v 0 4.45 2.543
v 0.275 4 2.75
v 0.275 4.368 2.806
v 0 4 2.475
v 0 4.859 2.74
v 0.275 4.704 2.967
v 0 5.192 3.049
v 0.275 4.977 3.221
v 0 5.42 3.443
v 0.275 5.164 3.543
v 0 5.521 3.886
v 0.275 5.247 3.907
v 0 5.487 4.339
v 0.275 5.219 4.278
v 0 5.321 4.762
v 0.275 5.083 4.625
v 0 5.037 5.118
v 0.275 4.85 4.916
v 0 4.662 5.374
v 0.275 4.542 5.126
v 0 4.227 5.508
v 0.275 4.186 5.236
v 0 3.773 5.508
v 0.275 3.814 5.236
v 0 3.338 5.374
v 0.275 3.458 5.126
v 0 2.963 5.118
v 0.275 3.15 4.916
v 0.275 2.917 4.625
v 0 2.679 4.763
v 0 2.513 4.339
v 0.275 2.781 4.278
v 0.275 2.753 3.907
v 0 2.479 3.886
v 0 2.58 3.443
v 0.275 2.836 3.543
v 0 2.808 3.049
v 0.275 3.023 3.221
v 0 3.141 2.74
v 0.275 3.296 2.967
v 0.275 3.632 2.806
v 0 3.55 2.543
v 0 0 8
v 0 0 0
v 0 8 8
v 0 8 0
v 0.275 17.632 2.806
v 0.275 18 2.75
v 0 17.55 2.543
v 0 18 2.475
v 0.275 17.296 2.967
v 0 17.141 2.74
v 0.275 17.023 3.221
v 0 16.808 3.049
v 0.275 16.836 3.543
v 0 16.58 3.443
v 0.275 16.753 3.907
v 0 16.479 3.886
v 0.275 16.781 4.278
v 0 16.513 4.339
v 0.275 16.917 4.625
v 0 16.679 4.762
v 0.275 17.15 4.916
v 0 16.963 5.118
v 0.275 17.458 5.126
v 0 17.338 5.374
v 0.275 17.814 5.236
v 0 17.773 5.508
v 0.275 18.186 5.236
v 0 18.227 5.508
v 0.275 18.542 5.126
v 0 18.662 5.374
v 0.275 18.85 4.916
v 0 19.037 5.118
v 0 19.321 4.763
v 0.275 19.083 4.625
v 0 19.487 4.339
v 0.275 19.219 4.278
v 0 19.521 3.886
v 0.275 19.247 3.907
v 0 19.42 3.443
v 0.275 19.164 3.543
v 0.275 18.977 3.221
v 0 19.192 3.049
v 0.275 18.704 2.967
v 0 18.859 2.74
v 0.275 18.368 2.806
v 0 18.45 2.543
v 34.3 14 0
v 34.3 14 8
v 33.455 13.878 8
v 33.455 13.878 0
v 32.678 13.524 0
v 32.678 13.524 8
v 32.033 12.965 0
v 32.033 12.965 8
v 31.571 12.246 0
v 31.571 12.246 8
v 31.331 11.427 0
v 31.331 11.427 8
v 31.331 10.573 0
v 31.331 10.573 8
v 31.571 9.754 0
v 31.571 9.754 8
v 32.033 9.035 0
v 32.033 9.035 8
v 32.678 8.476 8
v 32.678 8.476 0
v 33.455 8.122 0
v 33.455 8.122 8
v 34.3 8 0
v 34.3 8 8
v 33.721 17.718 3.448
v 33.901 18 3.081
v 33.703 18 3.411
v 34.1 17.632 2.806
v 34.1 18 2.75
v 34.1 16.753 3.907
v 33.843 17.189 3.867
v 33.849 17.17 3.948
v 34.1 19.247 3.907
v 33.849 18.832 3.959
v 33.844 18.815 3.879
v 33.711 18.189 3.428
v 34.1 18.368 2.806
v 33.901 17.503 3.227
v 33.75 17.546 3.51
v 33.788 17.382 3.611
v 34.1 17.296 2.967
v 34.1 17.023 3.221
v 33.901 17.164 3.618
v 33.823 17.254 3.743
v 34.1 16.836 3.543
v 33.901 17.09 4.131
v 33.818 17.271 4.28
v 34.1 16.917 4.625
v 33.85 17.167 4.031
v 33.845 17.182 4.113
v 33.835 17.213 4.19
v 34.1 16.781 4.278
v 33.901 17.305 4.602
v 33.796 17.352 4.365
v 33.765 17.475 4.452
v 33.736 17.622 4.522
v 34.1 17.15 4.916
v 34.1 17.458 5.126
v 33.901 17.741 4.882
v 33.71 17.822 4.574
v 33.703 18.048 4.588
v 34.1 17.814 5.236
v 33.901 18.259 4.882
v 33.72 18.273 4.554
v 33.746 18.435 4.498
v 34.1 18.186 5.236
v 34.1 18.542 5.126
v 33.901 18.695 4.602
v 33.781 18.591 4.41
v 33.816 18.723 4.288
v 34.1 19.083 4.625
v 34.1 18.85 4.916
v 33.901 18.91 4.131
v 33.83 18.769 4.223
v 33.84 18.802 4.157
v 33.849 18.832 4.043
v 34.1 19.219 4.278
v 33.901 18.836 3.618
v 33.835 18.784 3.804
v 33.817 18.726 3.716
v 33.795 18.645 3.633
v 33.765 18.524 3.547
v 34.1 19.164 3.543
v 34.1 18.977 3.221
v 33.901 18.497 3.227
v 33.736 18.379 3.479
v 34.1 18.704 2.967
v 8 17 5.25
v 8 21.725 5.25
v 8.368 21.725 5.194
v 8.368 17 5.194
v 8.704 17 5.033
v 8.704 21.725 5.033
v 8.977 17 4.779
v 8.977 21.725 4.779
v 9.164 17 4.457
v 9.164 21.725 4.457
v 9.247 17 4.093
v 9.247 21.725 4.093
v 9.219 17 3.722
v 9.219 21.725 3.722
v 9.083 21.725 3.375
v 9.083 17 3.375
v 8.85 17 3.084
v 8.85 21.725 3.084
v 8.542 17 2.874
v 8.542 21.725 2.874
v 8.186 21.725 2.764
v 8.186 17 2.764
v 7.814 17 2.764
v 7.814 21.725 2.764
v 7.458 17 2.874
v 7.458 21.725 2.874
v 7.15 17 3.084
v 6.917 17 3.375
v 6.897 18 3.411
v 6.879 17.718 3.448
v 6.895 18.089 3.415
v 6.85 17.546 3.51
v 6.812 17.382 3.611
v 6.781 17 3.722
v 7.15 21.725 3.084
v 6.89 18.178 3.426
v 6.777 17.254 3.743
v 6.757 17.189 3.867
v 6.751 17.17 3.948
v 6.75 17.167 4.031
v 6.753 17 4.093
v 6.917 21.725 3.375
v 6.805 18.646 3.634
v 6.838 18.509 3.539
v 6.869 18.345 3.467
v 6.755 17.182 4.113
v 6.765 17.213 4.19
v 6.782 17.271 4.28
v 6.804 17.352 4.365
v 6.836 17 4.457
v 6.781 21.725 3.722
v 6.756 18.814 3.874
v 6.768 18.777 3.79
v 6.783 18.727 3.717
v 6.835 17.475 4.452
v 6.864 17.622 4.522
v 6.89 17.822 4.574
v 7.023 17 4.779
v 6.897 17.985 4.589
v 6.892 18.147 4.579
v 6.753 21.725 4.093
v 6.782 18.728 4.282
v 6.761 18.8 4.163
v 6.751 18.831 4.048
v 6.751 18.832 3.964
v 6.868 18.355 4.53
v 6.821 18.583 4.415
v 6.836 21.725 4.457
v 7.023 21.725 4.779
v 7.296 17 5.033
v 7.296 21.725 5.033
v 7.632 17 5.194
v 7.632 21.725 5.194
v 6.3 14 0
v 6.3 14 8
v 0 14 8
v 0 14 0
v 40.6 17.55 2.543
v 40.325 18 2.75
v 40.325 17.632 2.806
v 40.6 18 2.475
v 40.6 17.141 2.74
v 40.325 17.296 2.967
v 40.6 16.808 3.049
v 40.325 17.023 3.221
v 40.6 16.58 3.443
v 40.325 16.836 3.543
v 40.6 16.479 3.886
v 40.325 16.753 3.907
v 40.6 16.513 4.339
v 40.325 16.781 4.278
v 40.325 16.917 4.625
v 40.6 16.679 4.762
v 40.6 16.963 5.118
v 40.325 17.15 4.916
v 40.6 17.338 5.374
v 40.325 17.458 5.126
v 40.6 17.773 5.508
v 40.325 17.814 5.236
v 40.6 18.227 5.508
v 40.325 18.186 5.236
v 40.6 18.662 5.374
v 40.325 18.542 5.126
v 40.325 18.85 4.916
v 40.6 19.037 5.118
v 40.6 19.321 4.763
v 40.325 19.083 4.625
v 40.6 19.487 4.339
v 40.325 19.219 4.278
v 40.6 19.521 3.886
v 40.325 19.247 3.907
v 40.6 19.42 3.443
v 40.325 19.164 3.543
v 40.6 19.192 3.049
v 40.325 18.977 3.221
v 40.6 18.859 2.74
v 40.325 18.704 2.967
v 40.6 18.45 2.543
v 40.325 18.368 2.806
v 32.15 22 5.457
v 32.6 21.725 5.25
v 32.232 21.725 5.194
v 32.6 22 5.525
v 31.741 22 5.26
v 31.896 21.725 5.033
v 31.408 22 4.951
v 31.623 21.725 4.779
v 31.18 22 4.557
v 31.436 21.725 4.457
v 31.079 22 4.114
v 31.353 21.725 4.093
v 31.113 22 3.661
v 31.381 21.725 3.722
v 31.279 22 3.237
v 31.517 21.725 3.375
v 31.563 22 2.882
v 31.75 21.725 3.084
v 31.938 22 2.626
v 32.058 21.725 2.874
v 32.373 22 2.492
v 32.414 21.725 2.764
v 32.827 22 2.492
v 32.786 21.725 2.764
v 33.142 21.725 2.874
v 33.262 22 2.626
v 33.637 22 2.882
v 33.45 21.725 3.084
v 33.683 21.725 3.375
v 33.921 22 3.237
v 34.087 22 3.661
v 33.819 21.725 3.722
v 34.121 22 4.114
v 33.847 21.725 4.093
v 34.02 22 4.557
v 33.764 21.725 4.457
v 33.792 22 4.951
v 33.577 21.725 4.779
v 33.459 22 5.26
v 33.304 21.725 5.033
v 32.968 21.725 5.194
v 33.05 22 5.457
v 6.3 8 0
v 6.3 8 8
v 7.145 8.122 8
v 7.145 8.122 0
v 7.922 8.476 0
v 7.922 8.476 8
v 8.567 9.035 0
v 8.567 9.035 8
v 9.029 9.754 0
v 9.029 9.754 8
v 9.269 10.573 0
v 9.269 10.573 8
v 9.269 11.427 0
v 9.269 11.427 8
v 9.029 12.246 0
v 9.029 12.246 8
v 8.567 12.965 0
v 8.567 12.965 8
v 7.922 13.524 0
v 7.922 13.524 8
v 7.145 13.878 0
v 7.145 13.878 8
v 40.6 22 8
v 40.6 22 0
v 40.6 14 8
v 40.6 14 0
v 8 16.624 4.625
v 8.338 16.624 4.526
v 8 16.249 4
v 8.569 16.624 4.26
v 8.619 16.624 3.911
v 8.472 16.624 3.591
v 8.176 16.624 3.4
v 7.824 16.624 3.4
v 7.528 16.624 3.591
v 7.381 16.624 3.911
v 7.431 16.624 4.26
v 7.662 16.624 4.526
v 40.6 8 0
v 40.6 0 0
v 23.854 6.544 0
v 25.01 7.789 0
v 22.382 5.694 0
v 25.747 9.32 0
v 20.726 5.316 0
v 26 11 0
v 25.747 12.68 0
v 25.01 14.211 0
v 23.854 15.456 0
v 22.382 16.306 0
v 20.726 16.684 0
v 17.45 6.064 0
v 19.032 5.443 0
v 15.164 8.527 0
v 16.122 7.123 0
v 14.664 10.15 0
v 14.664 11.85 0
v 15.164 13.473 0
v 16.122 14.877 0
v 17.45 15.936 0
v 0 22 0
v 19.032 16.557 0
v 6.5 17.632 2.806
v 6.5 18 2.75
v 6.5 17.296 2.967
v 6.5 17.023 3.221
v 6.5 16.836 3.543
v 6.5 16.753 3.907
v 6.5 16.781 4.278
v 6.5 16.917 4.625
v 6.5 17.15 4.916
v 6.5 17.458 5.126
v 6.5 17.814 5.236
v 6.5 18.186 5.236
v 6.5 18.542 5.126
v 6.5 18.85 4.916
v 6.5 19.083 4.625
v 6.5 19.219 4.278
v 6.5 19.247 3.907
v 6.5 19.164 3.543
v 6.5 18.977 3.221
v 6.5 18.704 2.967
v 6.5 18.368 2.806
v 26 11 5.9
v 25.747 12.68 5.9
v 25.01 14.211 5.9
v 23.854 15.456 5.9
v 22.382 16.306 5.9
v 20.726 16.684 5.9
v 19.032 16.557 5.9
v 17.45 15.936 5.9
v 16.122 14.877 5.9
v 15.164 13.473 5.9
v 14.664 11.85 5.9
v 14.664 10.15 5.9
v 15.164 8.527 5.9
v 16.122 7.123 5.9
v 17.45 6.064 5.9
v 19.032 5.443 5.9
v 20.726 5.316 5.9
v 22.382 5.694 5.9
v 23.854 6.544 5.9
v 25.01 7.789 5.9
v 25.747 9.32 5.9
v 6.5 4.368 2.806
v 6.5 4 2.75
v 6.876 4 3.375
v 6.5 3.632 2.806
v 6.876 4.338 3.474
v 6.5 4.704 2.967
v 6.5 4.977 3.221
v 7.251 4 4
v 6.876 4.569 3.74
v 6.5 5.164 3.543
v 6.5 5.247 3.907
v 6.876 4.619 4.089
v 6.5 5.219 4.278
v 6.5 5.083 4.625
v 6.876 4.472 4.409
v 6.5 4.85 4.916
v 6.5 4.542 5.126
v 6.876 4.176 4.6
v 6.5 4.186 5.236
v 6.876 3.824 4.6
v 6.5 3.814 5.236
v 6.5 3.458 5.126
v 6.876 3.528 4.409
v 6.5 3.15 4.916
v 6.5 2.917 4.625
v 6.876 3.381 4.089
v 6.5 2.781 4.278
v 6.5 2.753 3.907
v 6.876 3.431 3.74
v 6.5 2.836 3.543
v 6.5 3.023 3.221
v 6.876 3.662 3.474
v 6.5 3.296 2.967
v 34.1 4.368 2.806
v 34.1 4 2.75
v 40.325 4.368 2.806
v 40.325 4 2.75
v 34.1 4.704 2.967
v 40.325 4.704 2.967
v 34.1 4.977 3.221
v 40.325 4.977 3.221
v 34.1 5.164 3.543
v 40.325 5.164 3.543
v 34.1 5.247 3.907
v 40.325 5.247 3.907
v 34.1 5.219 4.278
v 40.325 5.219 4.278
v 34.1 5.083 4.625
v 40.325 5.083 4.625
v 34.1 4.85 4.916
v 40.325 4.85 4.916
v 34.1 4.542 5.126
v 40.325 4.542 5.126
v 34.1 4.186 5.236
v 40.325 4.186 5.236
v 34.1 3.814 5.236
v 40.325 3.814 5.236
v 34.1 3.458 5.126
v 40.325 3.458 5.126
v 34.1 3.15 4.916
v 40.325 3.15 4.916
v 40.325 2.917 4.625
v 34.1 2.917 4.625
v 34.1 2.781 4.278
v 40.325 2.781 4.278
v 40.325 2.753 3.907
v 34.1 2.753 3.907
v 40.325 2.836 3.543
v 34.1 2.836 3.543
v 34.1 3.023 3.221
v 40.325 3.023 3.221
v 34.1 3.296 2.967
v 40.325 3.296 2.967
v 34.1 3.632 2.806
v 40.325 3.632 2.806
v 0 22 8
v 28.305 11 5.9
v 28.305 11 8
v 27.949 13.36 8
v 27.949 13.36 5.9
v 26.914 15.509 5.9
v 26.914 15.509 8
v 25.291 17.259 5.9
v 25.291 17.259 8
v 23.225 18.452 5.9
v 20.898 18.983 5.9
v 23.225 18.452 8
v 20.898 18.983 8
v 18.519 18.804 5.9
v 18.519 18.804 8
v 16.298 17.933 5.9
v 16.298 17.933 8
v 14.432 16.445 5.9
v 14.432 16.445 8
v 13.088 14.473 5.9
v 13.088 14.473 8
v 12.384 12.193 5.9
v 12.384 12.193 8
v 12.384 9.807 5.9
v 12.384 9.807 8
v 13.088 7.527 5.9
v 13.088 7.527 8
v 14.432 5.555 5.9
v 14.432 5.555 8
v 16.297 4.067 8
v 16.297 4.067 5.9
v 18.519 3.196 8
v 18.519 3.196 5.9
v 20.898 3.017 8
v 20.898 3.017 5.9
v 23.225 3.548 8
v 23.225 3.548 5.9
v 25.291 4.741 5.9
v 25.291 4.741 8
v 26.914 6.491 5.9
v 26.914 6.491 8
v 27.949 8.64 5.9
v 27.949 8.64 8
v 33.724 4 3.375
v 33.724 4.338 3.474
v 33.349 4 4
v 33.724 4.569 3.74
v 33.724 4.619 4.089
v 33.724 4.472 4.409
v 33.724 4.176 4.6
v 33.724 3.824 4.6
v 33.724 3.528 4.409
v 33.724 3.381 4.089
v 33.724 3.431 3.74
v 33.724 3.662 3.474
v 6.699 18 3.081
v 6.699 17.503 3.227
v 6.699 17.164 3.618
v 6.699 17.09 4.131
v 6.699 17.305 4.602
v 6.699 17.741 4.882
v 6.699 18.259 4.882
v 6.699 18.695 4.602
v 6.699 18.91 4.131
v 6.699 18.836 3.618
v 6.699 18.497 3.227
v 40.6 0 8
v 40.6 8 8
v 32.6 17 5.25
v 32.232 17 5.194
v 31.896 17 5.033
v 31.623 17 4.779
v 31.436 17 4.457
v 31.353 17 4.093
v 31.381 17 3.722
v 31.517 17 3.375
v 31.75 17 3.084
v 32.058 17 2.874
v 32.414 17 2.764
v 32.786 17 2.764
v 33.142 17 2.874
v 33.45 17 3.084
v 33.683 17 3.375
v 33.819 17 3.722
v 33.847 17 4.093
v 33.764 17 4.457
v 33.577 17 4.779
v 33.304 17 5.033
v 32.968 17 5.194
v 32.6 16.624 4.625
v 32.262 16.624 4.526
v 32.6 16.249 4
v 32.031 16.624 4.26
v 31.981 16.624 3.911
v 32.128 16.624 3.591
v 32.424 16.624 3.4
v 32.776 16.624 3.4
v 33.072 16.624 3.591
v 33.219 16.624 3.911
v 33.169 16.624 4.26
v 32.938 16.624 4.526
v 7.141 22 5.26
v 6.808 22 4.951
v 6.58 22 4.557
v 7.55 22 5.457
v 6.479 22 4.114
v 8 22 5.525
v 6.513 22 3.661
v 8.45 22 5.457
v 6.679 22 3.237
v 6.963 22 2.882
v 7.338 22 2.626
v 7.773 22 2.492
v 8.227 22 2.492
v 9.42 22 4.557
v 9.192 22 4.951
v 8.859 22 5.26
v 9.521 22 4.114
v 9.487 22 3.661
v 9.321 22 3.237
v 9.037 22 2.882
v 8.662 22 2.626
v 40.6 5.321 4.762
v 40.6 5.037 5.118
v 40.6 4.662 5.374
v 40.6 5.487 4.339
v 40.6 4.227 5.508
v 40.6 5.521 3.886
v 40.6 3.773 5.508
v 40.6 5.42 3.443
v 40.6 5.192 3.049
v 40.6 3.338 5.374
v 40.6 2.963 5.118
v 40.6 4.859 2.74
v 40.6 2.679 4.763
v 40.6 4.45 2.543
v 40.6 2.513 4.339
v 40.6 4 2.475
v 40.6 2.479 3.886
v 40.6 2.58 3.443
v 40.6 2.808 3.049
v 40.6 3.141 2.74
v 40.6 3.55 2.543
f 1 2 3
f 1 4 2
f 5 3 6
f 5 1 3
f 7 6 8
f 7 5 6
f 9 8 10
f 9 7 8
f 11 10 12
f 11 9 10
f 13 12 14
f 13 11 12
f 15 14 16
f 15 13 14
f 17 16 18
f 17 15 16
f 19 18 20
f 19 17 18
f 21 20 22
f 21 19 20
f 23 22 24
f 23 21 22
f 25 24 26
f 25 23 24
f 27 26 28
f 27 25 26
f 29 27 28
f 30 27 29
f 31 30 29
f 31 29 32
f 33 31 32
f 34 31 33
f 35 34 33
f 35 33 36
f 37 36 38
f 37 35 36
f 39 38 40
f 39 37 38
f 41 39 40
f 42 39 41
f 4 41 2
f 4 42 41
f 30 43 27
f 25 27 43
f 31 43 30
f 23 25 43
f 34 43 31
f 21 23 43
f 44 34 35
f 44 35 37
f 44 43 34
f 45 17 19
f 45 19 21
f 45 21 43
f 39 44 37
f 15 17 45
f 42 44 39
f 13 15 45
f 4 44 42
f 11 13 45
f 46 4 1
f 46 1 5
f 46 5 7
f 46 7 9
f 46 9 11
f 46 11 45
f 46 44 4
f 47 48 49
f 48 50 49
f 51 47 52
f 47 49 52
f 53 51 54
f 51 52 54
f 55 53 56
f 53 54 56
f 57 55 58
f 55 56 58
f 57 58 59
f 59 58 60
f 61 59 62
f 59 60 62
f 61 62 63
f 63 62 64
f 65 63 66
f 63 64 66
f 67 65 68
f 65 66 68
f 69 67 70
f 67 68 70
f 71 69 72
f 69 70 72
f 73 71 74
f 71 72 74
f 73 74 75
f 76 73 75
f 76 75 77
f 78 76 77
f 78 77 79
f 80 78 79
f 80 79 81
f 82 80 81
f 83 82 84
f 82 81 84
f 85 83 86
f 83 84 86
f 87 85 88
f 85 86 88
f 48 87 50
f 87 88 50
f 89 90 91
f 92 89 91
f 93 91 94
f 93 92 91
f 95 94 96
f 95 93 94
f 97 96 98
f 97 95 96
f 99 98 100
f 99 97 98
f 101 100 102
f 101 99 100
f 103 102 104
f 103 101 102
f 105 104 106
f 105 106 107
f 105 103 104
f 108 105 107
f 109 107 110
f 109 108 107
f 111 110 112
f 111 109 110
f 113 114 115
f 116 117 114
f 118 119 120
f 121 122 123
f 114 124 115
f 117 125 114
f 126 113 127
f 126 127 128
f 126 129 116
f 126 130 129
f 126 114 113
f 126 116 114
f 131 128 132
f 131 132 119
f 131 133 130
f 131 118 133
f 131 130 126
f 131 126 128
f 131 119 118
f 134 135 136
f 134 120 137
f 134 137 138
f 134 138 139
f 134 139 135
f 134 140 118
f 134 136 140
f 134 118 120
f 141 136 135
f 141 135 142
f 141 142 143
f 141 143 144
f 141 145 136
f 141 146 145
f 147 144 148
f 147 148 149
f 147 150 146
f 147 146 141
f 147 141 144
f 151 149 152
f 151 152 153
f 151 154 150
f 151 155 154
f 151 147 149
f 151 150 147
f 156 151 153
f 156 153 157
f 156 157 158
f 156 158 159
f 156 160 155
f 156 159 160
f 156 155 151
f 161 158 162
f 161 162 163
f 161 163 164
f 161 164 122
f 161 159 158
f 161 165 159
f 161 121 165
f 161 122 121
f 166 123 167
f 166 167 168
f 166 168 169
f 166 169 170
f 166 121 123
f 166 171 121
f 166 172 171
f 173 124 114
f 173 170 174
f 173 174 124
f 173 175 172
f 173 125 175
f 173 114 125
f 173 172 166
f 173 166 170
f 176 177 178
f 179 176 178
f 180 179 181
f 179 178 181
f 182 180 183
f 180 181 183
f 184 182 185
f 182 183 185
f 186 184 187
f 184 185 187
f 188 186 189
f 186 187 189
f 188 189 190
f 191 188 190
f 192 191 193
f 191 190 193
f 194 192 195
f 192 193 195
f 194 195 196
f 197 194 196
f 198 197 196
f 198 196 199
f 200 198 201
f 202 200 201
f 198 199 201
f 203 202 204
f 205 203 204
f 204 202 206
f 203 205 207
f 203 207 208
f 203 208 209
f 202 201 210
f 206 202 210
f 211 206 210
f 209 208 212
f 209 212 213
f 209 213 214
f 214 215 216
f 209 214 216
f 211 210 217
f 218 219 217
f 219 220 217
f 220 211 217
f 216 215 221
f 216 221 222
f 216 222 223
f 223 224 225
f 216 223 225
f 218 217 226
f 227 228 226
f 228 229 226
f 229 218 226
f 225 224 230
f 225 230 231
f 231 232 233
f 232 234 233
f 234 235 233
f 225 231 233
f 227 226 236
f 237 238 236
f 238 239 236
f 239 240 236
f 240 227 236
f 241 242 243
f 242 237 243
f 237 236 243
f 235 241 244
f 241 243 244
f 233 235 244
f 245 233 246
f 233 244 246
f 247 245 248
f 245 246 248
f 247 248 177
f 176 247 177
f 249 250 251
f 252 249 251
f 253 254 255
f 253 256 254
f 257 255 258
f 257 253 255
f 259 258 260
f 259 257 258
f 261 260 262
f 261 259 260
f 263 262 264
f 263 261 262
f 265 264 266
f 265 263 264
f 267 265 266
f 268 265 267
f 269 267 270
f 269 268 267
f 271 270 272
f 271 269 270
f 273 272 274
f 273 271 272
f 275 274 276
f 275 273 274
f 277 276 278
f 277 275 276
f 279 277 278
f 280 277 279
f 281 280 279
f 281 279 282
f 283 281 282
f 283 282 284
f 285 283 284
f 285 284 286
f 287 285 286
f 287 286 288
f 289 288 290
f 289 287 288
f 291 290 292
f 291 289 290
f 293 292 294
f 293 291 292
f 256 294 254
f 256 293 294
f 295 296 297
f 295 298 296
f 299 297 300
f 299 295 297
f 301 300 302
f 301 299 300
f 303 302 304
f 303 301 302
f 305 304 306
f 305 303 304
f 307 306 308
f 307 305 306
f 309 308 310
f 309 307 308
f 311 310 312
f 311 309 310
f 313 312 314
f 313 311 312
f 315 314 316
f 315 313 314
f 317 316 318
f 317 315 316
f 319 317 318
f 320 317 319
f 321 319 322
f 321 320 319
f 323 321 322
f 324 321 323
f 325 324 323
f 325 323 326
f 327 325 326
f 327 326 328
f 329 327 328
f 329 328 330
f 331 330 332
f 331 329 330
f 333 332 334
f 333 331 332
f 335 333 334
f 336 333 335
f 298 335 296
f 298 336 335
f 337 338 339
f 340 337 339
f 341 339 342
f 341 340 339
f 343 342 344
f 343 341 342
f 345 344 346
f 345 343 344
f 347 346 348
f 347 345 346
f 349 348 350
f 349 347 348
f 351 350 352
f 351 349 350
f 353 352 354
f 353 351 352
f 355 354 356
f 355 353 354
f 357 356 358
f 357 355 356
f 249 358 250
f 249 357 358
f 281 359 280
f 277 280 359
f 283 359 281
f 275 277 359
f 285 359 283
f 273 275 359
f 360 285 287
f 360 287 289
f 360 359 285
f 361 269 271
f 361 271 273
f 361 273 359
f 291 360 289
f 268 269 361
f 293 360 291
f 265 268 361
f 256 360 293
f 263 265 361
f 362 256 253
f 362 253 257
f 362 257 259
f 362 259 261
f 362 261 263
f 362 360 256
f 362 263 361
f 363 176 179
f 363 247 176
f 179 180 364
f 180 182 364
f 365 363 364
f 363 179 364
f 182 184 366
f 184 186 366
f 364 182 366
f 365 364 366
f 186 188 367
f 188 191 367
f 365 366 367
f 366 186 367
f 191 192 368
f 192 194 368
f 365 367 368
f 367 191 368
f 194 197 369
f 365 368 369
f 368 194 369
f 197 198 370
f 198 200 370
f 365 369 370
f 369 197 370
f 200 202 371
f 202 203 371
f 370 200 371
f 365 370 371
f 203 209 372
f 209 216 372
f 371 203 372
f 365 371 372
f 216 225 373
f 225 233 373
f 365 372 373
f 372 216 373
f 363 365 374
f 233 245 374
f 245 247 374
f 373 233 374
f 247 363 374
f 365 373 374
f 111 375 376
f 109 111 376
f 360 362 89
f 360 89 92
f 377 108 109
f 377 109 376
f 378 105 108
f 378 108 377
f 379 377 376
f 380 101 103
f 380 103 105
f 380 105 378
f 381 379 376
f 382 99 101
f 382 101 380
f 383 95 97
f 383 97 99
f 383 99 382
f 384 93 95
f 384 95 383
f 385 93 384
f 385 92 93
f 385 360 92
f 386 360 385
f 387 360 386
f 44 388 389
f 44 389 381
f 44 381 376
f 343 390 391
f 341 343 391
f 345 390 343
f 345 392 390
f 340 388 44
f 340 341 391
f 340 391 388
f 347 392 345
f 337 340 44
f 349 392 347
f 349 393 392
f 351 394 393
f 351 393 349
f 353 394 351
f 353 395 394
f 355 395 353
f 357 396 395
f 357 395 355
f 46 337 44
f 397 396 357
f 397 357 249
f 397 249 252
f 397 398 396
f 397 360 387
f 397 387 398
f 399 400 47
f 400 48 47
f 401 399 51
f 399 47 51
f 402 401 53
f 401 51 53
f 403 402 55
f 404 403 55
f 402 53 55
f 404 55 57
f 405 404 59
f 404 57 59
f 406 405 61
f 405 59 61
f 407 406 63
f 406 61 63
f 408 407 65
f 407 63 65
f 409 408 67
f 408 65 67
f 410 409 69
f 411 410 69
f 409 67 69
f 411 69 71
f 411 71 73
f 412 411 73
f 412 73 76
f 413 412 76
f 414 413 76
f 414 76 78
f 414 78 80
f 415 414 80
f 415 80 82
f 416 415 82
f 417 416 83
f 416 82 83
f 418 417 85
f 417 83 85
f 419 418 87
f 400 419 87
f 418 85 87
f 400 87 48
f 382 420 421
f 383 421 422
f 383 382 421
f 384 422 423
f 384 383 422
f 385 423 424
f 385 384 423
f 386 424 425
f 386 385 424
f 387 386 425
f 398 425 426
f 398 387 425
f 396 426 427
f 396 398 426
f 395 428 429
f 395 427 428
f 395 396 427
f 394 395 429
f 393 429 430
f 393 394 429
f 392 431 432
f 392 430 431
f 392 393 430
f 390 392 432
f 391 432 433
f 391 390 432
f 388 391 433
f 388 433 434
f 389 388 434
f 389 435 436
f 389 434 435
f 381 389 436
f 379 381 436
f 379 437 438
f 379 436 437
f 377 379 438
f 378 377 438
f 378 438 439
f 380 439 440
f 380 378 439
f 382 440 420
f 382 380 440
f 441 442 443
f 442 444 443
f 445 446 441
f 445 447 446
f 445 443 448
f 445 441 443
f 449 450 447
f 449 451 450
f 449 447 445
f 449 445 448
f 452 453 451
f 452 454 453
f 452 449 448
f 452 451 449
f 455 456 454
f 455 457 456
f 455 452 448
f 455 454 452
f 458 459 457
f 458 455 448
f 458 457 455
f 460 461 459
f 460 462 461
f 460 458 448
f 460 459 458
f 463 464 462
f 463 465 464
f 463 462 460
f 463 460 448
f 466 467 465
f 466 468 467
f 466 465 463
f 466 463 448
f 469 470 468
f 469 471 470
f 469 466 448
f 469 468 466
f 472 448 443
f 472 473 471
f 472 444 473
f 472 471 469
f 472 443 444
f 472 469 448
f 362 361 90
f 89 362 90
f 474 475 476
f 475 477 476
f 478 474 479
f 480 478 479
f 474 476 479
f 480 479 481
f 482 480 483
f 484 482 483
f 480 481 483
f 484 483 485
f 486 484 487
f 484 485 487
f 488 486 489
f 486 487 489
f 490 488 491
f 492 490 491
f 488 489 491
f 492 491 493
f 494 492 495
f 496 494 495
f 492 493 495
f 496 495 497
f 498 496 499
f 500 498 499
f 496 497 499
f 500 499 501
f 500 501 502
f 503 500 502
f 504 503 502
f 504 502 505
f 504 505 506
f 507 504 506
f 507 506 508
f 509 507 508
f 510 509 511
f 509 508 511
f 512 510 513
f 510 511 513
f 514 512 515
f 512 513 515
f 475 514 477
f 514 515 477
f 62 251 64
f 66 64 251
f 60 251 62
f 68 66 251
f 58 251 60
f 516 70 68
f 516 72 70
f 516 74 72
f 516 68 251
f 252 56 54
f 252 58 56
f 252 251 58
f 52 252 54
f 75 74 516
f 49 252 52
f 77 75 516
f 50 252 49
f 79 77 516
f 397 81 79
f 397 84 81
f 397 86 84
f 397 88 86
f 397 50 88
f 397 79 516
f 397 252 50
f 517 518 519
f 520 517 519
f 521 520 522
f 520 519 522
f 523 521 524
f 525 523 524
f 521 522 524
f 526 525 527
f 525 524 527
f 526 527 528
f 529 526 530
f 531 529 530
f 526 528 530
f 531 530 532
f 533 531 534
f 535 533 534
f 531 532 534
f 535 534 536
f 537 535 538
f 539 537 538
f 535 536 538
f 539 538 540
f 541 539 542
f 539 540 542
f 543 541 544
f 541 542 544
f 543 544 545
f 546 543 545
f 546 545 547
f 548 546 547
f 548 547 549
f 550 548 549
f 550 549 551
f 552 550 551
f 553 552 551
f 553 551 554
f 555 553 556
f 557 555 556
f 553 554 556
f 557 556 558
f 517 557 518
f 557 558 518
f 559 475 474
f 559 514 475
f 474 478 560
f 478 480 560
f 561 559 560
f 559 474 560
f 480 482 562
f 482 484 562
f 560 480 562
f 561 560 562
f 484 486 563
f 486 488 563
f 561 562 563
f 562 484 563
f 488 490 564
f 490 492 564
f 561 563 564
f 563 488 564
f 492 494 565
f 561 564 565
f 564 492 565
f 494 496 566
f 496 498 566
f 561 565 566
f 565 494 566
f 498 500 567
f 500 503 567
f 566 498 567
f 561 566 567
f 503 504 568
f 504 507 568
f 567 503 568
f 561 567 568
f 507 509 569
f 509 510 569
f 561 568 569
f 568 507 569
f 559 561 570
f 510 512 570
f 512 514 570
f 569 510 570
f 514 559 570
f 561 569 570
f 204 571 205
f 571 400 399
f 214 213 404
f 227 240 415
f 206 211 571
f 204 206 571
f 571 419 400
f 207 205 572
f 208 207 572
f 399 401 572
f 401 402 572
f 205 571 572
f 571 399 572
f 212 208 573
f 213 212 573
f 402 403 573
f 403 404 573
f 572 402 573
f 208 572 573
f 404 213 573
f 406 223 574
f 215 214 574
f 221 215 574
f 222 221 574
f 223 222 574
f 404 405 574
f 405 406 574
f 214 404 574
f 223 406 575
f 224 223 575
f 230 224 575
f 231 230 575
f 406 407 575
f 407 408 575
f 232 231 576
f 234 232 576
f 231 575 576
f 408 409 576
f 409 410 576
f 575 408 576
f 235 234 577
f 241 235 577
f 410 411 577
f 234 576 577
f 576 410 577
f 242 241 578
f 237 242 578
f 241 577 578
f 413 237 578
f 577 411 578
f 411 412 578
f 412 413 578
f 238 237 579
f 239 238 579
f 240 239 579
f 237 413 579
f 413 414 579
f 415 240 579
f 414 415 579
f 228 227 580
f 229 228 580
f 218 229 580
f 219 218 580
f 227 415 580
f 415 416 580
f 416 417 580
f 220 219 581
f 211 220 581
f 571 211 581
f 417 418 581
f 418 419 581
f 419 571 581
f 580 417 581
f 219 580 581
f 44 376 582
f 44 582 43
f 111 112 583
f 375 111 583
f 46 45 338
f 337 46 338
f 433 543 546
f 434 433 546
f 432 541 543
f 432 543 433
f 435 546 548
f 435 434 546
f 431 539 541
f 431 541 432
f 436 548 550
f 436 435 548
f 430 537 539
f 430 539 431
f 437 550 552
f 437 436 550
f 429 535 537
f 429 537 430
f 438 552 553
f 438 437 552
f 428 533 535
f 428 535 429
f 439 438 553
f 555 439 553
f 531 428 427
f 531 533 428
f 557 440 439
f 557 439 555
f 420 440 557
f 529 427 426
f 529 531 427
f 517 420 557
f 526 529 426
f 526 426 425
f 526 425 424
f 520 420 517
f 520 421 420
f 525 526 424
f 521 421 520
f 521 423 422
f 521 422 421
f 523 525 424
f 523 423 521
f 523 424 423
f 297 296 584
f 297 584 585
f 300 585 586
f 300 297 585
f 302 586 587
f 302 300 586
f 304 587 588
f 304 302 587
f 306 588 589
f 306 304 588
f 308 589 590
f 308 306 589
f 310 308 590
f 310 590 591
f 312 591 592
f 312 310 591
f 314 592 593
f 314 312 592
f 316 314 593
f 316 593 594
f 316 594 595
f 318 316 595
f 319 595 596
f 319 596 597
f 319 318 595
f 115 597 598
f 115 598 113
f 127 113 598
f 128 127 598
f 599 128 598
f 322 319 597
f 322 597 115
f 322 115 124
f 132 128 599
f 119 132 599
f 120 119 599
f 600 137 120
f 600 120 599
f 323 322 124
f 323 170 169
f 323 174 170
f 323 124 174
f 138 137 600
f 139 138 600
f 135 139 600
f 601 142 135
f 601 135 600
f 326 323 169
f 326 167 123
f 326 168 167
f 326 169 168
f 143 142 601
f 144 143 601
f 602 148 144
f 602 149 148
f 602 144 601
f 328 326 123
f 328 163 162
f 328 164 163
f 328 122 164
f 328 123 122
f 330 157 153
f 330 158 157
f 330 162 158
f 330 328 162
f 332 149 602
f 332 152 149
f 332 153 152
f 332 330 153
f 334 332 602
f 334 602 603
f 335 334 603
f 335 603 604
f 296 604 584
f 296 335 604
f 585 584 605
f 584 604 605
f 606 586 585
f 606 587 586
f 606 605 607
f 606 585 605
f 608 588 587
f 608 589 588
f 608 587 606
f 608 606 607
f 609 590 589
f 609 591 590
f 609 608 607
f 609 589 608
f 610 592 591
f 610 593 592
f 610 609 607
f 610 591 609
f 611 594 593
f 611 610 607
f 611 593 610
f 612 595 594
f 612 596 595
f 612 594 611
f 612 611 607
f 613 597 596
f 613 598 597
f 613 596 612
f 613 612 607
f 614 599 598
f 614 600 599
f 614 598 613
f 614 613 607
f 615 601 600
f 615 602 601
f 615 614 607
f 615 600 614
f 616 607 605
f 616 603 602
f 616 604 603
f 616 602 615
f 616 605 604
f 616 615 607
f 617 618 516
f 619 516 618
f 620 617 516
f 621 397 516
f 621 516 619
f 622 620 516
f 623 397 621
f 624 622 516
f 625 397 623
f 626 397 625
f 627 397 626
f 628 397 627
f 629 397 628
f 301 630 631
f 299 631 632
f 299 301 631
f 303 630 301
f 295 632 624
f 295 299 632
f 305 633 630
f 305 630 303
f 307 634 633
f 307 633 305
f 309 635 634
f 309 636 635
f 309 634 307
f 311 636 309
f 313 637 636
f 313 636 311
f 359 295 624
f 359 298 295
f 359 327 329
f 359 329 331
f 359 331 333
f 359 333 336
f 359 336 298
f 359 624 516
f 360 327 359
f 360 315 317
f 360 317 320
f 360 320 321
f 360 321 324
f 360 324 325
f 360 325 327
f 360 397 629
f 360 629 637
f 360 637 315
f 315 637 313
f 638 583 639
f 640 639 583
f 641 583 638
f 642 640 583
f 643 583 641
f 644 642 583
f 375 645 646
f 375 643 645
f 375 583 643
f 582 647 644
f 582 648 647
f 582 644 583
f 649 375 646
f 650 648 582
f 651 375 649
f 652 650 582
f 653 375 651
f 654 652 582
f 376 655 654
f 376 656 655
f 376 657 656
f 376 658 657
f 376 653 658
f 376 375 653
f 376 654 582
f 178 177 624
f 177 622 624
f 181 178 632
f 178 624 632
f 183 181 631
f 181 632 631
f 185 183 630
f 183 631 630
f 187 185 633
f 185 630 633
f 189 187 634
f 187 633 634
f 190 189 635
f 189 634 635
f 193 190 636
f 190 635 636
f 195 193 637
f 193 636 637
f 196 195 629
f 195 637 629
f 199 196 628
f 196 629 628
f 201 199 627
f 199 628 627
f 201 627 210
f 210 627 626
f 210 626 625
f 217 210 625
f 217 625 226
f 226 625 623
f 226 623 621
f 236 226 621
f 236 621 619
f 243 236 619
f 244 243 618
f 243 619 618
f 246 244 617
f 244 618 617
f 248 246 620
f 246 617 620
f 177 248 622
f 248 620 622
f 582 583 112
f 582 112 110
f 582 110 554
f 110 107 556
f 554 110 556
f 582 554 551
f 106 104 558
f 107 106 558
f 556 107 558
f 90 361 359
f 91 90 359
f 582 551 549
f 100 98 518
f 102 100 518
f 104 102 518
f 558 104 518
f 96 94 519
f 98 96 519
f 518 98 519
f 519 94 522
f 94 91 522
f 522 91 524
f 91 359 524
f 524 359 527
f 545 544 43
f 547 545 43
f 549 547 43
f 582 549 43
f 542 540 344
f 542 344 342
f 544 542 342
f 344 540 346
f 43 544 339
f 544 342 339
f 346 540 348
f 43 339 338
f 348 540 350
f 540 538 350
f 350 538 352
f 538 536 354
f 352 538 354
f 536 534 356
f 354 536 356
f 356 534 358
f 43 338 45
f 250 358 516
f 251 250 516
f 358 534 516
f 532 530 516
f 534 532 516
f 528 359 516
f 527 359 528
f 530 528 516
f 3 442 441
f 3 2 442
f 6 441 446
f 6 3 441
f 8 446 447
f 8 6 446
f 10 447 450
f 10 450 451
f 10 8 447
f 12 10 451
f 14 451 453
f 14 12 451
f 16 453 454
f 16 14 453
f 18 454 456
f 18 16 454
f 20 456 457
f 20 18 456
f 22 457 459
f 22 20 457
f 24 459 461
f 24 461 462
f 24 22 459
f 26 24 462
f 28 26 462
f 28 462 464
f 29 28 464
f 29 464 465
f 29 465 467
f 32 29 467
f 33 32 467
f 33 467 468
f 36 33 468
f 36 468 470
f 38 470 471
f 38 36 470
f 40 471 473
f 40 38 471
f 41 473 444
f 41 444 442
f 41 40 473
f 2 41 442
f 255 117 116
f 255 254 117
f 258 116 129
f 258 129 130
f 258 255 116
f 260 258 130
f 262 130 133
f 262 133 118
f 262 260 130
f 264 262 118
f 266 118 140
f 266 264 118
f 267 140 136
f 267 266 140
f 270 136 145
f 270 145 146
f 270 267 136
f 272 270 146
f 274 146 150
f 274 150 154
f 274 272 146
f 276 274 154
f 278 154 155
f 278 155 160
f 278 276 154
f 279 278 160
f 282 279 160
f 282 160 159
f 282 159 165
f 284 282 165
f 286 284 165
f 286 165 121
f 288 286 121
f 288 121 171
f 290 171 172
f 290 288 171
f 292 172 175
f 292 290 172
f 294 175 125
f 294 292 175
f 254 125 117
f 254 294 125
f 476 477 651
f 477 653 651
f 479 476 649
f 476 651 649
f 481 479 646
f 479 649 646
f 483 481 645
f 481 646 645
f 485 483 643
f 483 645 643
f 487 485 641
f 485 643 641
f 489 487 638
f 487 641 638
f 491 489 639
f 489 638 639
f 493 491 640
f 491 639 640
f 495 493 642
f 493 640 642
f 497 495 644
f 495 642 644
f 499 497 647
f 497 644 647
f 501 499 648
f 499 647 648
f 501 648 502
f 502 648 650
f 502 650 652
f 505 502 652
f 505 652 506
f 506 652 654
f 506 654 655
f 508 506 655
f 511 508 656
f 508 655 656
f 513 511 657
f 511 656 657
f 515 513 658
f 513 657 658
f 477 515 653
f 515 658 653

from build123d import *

# Parameters (mm, degrees)
SKETCH1_R           = 5.7
BOSS_EXTRUDE1_DEPTH = 8
SKETCH2_R           = 8.005
CUT_EXTRUDE1_DEPTH  = 2.1


with BuildPart() as part:
    # Sketch1 → Boss-Extrude1 (new body)
    with BuildSketch(Plane.XY):
        with BuildLine():
            Line((0, 14), (0, 22))
            Line((0, 22), (40.6, 22))
            Line((40.6, 22), (40.6, 14))
            Line((40.6, 14), (34.3, 14))
            ThreePointArc((34.3, 14), (31.3, 11), (34.3, 8))
            Line((34.3, 8), (40.6, 8))
            Line((40.6, 8), (40.6, 0))
            Line((40.6, 0), (0, 0))
            Line((0, 0), (0, 8))
            Line((0, 8), (6.3, 8))
            ThreePointArc((6.3, 8), (9.3, 11), (6.3, 14))
            Line((6.3, 14), (0, 14))
        make_face()
        with Locations((20.3, 11)):
            Circle(SKETCH1_R, mode=Mode.SUBTRACT)
    extrude(amount=BOSS_EXTRUDE1_DEPTH)

    # Sketch2 → Cut-Extrude1 (cut)
    with BuildSketch(Plane.XY.offset(8)):
        with Locations((20.3, 11)):
            Circle(SKETCH2_R)
    extrude(amount=-CUT_EXTRUDE1_DEPTH, mode=Mode.SUBTRACT)

    # Sketch3 → M3x0.5 Tapped Hole1 (revolve, cut)
    with BuildSketch(Plane(origin=(32.6, 22, 4), x_dir=(0, 0, 1), z_dir=(1, 0, 0))):
        Polygon((0, 0), (0, 5.751075774), (1.25, 5), (1.25, 0.275), (1.525, 0), align=None)
    m3x0_5_tapped_hole1 = revolve(axis=Axis((32.6, 28.35, 4), (0, -1, 0)), mode=Mode.SUBTRACT)

    # Mirror1: M3x0.5 Tapped Hole1 across plane
    add(m3x0_5_tapped_hole1.mirror(Plane(origin=(20.3, 0, 0), x_dir=(0, 0, 1), z_dir=(1, 0, 0))), mode=Mode.SUBTRACT)

    # Sketch5 → M3x0.5 Tapped Hole2 (revolve, cut)
    with BuildSketch(Plane(origin=(40.6, 18, 4), x_dir=(0, 0, -1), z_dir=(0, 1, 0))):
        Polygon((0, 0), (0, 7.251075774), (1.25, 6.5), (1.25, 0.275), (1.525, 0), align=None)
    m3x0_5_tapped_hole2 = revolve(axis=Axis((46.95, 18, 4), (-1, 0, 0)), mode=Mode.SUBTRACT)

    # Mirror2: M3x0.5 Tapped Hole2 across plane
    add(m3x0_5_tapped_hole2.mirror(Plane(origin=(0, 11, 0), x_dir=(0, 0, 1), z_dir=(0, -1, 0))), mode=Mode.SUBTRACT)

    # Mirror3: M3x0.5 Tapped Hole2 across plane
    add(m3x0_5_tapped_hole2.mirror(Plane(origin=(20.3, 0, 0), x_dir=(0, 0, 1), z_dir=(1, 0, 0))), mode=Mode.SUBTRACT)

    # Mirror3 copy 1 sketch → Mirror3 copy 1 (revolve, cut)
    with BuildSketch(Plane(origin=(0, 4, 4), x_dir=(0, 0, -1), z_dir=(0, -1, 0))):
        Polygon((0, 0), (0, 7.251075774), (1.25, 6.5), (1.25, 0.275), (1.525, 0), align=None)
    revolve(axis=Axis((-6.35, 4, 4), (1, 0, 0)), mode=Mode.SUBTRACT)


solid = part.part
